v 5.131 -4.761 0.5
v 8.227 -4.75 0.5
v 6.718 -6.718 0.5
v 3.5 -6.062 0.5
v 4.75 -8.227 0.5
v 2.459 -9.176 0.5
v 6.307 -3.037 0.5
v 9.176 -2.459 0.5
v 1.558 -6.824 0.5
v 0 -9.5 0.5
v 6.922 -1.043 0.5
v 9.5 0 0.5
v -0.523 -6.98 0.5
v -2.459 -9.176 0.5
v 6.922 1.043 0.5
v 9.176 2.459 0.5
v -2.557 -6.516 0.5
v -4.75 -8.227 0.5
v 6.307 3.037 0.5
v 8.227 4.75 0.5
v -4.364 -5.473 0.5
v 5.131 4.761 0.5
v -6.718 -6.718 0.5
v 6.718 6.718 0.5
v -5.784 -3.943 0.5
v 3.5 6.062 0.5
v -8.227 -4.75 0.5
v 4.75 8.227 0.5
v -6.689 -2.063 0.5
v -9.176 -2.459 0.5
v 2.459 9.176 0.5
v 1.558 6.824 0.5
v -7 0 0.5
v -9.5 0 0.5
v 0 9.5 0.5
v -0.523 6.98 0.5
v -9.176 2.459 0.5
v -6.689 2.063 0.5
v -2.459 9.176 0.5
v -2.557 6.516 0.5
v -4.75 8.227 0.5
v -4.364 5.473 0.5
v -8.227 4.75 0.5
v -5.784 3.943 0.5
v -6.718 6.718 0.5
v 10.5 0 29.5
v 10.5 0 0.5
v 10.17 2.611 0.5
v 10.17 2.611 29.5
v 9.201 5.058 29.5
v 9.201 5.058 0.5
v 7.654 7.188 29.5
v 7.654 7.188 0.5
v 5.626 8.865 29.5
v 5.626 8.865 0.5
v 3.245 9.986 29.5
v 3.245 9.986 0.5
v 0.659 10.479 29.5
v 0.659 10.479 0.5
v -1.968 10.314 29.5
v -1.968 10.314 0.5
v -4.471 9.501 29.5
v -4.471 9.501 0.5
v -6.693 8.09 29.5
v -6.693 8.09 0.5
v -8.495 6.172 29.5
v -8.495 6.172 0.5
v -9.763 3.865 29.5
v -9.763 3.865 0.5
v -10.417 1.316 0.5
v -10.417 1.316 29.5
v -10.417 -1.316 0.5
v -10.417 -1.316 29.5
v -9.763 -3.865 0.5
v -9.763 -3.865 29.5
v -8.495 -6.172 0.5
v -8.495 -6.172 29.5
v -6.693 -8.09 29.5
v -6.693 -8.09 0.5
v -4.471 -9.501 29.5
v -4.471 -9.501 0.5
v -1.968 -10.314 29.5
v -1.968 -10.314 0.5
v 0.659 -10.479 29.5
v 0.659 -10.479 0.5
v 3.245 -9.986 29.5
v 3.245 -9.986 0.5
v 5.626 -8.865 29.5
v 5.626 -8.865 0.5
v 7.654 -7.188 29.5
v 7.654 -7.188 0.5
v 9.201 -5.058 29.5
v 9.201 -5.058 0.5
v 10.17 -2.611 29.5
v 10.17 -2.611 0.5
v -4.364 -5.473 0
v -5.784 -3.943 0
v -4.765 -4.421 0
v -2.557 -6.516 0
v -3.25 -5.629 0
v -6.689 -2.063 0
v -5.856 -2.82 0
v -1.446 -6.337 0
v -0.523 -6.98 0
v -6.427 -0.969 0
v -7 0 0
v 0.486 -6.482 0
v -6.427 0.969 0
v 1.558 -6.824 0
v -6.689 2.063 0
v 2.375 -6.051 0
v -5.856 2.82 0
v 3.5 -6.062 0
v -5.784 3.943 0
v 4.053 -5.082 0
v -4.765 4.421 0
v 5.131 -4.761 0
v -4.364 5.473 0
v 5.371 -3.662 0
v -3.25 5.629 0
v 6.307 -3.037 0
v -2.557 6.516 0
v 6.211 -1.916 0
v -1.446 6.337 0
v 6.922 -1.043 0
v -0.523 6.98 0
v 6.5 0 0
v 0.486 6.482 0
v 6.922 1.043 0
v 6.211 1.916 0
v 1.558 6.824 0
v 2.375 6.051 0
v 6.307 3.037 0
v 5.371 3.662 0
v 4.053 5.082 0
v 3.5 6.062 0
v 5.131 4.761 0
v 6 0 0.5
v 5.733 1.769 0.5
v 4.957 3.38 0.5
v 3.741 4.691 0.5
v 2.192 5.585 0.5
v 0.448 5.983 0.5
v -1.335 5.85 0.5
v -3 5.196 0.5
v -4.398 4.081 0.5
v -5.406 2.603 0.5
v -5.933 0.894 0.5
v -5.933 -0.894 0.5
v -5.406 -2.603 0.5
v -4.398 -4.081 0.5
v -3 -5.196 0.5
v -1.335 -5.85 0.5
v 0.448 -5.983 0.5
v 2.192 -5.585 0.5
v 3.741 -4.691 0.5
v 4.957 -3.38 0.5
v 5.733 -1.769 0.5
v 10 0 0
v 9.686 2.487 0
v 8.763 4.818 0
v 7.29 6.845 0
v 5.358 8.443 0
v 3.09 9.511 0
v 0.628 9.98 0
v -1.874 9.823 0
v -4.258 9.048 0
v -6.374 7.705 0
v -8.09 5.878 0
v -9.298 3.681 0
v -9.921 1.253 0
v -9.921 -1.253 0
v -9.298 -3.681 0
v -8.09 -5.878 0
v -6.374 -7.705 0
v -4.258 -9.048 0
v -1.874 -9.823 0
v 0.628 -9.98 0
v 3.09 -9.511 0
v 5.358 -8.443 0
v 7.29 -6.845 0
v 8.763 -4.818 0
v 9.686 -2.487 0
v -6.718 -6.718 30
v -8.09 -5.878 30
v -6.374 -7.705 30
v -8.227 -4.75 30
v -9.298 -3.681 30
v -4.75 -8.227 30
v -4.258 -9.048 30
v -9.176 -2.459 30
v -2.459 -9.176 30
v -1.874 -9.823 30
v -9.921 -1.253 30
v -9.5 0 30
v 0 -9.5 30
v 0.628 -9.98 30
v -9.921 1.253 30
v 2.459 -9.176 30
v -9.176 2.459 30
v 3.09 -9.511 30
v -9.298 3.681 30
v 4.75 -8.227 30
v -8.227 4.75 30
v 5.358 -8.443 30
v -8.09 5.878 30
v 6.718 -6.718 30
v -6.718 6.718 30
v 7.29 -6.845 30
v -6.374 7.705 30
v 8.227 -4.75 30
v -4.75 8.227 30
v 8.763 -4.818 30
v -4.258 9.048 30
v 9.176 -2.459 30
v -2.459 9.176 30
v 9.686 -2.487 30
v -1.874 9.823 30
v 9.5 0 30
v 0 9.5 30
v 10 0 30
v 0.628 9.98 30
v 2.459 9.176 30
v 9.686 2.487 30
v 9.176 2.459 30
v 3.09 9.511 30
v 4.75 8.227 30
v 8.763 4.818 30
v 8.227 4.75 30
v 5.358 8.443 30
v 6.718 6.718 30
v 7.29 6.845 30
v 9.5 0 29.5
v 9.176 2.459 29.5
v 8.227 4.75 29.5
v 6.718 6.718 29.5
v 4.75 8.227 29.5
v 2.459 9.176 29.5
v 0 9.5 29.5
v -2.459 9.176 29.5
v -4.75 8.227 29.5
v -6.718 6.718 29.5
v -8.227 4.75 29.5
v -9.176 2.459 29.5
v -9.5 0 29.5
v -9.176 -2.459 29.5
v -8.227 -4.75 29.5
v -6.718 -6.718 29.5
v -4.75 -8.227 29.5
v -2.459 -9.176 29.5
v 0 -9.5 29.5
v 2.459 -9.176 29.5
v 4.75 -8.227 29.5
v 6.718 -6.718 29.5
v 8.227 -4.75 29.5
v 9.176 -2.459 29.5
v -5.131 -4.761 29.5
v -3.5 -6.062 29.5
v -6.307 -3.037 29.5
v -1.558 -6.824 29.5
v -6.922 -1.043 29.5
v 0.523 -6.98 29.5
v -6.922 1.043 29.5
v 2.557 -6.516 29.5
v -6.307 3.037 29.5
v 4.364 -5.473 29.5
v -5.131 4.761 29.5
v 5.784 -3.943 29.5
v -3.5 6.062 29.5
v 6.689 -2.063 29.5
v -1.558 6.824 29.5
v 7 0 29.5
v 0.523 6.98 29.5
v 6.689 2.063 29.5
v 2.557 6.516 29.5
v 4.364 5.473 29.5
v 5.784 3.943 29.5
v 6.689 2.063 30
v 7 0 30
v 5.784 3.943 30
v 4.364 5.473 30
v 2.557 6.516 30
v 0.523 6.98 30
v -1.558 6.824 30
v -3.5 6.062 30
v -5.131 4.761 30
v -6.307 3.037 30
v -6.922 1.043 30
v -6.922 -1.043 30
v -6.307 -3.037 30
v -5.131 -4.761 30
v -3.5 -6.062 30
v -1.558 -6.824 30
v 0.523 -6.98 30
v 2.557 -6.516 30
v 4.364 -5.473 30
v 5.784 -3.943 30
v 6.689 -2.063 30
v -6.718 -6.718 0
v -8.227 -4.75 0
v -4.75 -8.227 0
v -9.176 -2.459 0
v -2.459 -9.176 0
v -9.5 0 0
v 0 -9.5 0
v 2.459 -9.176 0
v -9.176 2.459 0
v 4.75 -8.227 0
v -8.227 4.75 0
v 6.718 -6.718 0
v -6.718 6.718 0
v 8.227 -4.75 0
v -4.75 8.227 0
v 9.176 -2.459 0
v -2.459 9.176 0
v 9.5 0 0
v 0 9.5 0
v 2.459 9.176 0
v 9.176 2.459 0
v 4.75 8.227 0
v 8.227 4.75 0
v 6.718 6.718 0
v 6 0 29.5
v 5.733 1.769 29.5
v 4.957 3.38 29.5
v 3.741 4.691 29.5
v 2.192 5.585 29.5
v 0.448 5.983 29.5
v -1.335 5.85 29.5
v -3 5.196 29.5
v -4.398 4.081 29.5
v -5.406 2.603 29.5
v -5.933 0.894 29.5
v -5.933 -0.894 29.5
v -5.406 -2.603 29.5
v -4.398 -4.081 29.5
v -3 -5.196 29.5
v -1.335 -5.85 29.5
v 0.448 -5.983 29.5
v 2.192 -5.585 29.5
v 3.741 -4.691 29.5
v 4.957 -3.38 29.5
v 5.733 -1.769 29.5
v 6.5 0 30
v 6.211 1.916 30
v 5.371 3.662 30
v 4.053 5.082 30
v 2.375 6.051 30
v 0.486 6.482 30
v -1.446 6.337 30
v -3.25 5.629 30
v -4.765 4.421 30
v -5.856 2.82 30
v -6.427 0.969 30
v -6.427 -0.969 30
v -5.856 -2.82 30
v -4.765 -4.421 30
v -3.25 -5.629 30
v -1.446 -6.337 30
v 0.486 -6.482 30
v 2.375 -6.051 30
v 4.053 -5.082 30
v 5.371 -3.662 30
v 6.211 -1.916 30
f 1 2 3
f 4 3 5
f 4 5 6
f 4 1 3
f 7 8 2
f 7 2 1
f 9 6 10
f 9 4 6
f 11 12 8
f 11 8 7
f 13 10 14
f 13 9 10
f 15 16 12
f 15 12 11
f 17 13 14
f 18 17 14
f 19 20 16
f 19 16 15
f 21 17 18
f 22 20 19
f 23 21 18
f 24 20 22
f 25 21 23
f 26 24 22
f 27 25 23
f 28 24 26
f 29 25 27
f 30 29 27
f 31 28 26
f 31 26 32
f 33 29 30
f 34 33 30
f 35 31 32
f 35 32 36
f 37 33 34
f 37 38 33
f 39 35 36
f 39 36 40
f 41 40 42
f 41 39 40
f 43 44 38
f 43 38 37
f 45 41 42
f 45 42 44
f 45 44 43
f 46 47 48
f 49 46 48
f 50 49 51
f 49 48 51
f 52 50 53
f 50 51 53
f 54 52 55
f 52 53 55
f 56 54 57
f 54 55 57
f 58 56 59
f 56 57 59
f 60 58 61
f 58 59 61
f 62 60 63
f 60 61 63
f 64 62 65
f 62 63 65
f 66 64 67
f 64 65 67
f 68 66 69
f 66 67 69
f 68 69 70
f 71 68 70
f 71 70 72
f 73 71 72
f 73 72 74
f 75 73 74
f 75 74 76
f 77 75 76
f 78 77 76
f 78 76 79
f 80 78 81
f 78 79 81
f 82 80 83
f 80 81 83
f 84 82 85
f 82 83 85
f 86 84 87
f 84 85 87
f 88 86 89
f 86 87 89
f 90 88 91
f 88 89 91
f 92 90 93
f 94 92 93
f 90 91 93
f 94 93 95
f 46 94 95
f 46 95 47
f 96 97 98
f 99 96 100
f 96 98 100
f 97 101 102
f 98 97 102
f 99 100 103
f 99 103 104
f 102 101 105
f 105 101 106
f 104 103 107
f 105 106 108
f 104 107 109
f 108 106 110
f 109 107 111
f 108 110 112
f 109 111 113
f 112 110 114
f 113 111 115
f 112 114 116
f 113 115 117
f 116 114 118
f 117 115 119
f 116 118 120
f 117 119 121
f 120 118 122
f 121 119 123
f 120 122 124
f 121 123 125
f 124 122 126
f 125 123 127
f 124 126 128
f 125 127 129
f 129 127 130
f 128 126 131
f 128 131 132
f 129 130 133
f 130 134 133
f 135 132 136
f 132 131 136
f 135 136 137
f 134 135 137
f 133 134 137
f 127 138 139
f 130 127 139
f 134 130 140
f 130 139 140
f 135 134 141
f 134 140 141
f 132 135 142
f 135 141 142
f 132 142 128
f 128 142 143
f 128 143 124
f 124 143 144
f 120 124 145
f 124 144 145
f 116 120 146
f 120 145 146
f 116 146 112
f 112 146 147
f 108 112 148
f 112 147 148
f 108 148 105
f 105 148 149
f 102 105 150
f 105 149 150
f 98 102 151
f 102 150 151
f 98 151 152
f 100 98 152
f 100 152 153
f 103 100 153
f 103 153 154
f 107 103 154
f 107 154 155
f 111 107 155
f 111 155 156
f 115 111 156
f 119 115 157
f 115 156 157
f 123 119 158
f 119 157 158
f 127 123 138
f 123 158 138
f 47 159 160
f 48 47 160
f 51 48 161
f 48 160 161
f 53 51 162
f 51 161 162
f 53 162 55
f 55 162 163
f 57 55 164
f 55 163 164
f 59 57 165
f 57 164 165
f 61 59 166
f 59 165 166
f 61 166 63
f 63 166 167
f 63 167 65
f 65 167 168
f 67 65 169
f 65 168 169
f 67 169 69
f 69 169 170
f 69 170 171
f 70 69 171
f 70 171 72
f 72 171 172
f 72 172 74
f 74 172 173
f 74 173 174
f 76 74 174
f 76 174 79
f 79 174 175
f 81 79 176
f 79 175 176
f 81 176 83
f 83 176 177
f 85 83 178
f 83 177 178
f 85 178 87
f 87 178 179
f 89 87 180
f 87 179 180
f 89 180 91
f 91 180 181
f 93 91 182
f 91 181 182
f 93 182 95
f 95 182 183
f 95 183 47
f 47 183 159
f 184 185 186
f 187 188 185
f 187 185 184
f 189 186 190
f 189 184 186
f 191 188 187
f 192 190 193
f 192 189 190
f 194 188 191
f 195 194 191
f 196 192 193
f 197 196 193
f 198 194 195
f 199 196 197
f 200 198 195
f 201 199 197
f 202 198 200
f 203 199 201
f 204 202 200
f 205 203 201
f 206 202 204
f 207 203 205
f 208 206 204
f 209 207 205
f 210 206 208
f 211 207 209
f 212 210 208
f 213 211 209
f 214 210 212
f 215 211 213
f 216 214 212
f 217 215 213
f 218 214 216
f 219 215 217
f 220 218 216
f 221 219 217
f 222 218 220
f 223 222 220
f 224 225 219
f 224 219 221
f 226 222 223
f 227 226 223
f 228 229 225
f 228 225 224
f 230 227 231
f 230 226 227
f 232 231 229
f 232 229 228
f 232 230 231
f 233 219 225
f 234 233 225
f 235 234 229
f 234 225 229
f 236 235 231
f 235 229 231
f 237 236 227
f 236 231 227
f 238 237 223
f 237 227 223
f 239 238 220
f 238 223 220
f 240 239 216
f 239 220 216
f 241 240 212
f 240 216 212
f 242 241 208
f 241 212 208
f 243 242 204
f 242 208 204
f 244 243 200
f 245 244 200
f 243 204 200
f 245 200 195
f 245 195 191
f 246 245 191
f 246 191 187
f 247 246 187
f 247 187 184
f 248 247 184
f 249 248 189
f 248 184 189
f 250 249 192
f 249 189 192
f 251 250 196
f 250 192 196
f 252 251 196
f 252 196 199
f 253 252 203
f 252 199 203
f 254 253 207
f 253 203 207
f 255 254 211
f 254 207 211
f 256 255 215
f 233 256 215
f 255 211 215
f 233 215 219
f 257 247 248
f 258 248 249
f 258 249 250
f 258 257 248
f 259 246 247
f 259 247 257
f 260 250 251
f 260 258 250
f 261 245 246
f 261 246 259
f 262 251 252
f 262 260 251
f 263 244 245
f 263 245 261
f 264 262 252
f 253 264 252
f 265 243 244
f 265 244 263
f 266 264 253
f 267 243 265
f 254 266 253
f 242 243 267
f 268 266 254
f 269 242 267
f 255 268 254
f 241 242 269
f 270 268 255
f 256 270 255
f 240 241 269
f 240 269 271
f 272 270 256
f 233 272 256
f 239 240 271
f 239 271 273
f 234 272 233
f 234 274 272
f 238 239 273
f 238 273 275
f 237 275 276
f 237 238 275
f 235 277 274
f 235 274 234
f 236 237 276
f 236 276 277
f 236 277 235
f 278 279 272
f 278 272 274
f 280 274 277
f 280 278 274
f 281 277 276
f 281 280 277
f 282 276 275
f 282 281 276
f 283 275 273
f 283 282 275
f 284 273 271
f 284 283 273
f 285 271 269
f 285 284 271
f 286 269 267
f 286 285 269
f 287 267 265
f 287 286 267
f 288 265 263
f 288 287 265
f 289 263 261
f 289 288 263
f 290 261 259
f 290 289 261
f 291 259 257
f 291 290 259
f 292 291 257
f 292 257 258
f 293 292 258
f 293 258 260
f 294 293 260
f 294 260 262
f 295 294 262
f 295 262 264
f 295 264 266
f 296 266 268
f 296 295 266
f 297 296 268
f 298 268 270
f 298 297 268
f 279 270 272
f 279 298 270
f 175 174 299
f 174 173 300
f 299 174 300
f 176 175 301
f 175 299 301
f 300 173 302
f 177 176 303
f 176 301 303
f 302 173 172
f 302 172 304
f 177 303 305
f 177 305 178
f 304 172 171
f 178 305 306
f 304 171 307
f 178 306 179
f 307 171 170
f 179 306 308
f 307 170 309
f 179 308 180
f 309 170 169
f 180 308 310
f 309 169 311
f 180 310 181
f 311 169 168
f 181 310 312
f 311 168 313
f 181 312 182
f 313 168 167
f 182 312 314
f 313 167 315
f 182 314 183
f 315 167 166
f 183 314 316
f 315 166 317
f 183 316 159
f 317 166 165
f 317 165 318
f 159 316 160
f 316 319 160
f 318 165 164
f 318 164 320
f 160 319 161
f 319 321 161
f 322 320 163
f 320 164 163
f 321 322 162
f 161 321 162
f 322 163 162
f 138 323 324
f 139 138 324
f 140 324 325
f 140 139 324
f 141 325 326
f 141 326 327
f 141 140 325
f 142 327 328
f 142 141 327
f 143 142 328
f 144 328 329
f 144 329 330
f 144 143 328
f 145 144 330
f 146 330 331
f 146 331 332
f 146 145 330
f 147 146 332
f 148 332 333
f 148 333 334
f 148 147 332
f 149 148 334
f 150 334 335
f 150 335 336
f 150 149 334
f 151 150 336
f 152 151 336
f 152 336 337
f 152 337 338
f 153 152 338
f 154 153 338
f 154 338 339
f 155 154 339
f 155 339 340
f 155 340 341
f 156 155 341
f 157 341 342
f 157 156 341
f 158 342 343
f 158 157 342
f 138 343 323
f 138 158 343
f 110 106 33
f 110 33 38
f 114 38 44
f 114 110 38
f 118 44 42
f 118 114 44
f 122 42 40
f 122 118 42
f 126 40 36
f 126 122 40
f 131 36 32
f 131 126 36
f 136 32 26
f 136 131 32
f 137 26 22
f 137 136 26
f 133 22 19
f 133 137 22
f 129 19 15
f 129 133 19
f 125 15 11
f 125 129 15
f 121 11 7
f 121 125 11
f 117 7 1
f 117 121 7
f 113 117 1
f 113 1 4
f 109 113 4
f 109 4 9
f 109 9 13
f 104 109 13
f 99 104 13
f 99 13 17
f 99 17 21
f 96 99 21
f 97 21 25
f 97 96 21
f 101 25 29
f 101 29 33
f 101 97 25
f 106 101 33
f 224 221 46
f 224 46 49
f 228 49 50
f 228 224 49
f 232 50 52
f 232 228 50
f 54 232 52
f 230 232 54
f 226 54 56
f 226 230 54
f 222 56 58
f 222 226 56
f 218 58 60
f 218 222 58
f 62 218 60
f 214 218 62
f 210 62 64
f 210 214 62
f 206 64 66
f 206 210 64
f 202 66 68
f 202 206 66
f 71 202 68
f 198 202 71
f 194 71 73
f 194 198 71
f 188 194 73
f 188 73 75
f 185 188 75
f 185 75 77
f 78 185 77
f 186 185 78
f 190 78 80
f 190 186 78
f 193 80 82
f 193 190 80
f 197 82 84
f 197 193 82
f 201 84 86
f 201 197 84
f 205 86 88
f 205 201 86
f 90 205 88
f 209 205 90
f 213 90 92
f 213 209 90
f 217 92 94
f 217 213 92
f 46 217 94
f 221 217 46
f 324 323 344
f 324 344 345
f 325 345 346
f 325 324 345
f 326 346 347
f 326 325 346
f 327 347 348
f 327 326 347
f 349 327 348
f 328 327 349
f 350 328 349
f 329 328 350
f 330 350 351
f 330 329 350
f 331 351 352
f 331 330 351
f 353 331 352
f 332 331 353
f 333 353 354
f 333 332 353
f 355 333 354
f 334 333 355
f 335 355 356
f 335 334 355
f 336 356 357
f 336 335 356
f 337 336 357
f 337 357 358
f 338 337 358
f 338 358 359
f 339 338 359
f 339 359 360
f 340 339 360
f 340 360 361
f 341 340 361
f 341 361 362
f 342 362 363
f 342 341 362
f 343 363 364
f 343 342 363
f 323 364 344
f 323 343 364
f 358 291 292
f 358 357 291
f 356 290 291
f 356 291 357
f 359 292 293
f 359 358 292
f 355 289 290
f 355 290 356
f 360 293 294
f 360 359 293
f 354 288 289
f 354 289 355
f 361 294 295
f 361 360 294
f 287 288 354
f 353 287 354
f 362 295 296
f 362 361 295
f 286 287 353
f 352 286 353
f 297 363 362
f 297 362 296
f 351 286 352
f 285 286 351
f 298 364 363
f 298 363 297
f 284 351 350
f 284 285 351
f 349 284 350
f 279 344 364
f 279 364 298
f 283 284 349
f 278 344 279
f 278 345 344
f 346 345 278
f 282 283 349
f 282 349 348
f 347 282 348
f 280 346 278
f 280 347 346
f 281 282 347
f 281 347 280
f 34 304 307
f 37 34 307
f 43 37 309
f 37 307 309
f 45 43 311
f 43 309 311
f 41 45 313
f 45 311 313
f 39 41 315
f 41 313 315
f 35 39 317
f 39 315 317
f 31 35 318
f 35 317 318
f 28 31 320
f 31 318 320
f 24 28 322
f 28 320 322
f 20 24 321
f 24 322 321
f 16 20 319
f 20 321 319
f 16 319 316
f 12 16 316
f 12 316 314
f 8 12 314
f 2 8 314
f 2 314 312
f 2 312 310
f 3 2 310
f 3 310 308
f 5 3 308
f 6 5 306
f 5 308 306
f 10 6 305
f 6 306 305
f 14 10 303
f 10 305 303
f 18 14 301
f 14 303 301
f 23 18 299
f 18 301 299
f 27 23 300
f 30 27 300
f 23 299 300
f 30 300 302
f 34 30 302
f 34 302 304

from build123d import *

# Parameters (mm, degrees)
SKETCH1_R           = 10.5
SKETCH1_R_2         = 6
BOSS_EXTRUDE1_DEPTH = 30
SKETCH2_R           = 9.5
SKETCH2_R_2         = 7
CUT_EXTRUDE1_DEPTH  = 0.5
SKETCH3_R           = 9.5
SKETCH3_R_2         = 7
CUT_EXTRUDE2_DEPTH  = 0.5
CHAMFER1_SIZE       = 0.5


with BuildPart() as part:
    # Sketch1 → Boss-Extrude1 (new body)
    with BuildSketch(Plane.XY):
        Circle(SKETCH1_R)
        Circle(SKETCH1_R_2, mode=Mode.SUBTRACT)
    extrude(amount=BOSS_EXTRUDE1_DEPTH)

    # Sketch2 → Cut-Extrude1 (cut)
    with BuildSketch(Plane.XY.offset(30)):
        Circle(SKETCH2_R)
        Circle(SKETCH2_R_2, mode=Mode.SUBTRACT)
    extrude(amount=-CUT_EXTRUDE1_DEPTH, mode=Mode.SUBTRACT)

    # Sketch3 → Cut-Extrude2 (cut)
    with BuildSketch(Plane(origin=(0, 0, 0), x_dir=(-1, 0, 0), z_dir=(0, 0, -1))):
        Circle(SKETCH3_R)
        Circle(SKETCH3_R_2, mode=Mode.SUBTRACT)
    extrude(amount=-CUT_EXTRUDE2_DEPTH, mode=Mode.SUBTRACT)

    # Chamfer1
    chamfer1_edges = [part.edges().sort_by_distance(p)[0] for p in [
        (-10.5, 0, 0),
        (-10.5, 0, 30),
        (-6, 0, 0),
        (-6, 0, 30),
    ]]
    chamfer(chamfer1_edges, length=CHAMFER1_SIZE)


solid = part.part
